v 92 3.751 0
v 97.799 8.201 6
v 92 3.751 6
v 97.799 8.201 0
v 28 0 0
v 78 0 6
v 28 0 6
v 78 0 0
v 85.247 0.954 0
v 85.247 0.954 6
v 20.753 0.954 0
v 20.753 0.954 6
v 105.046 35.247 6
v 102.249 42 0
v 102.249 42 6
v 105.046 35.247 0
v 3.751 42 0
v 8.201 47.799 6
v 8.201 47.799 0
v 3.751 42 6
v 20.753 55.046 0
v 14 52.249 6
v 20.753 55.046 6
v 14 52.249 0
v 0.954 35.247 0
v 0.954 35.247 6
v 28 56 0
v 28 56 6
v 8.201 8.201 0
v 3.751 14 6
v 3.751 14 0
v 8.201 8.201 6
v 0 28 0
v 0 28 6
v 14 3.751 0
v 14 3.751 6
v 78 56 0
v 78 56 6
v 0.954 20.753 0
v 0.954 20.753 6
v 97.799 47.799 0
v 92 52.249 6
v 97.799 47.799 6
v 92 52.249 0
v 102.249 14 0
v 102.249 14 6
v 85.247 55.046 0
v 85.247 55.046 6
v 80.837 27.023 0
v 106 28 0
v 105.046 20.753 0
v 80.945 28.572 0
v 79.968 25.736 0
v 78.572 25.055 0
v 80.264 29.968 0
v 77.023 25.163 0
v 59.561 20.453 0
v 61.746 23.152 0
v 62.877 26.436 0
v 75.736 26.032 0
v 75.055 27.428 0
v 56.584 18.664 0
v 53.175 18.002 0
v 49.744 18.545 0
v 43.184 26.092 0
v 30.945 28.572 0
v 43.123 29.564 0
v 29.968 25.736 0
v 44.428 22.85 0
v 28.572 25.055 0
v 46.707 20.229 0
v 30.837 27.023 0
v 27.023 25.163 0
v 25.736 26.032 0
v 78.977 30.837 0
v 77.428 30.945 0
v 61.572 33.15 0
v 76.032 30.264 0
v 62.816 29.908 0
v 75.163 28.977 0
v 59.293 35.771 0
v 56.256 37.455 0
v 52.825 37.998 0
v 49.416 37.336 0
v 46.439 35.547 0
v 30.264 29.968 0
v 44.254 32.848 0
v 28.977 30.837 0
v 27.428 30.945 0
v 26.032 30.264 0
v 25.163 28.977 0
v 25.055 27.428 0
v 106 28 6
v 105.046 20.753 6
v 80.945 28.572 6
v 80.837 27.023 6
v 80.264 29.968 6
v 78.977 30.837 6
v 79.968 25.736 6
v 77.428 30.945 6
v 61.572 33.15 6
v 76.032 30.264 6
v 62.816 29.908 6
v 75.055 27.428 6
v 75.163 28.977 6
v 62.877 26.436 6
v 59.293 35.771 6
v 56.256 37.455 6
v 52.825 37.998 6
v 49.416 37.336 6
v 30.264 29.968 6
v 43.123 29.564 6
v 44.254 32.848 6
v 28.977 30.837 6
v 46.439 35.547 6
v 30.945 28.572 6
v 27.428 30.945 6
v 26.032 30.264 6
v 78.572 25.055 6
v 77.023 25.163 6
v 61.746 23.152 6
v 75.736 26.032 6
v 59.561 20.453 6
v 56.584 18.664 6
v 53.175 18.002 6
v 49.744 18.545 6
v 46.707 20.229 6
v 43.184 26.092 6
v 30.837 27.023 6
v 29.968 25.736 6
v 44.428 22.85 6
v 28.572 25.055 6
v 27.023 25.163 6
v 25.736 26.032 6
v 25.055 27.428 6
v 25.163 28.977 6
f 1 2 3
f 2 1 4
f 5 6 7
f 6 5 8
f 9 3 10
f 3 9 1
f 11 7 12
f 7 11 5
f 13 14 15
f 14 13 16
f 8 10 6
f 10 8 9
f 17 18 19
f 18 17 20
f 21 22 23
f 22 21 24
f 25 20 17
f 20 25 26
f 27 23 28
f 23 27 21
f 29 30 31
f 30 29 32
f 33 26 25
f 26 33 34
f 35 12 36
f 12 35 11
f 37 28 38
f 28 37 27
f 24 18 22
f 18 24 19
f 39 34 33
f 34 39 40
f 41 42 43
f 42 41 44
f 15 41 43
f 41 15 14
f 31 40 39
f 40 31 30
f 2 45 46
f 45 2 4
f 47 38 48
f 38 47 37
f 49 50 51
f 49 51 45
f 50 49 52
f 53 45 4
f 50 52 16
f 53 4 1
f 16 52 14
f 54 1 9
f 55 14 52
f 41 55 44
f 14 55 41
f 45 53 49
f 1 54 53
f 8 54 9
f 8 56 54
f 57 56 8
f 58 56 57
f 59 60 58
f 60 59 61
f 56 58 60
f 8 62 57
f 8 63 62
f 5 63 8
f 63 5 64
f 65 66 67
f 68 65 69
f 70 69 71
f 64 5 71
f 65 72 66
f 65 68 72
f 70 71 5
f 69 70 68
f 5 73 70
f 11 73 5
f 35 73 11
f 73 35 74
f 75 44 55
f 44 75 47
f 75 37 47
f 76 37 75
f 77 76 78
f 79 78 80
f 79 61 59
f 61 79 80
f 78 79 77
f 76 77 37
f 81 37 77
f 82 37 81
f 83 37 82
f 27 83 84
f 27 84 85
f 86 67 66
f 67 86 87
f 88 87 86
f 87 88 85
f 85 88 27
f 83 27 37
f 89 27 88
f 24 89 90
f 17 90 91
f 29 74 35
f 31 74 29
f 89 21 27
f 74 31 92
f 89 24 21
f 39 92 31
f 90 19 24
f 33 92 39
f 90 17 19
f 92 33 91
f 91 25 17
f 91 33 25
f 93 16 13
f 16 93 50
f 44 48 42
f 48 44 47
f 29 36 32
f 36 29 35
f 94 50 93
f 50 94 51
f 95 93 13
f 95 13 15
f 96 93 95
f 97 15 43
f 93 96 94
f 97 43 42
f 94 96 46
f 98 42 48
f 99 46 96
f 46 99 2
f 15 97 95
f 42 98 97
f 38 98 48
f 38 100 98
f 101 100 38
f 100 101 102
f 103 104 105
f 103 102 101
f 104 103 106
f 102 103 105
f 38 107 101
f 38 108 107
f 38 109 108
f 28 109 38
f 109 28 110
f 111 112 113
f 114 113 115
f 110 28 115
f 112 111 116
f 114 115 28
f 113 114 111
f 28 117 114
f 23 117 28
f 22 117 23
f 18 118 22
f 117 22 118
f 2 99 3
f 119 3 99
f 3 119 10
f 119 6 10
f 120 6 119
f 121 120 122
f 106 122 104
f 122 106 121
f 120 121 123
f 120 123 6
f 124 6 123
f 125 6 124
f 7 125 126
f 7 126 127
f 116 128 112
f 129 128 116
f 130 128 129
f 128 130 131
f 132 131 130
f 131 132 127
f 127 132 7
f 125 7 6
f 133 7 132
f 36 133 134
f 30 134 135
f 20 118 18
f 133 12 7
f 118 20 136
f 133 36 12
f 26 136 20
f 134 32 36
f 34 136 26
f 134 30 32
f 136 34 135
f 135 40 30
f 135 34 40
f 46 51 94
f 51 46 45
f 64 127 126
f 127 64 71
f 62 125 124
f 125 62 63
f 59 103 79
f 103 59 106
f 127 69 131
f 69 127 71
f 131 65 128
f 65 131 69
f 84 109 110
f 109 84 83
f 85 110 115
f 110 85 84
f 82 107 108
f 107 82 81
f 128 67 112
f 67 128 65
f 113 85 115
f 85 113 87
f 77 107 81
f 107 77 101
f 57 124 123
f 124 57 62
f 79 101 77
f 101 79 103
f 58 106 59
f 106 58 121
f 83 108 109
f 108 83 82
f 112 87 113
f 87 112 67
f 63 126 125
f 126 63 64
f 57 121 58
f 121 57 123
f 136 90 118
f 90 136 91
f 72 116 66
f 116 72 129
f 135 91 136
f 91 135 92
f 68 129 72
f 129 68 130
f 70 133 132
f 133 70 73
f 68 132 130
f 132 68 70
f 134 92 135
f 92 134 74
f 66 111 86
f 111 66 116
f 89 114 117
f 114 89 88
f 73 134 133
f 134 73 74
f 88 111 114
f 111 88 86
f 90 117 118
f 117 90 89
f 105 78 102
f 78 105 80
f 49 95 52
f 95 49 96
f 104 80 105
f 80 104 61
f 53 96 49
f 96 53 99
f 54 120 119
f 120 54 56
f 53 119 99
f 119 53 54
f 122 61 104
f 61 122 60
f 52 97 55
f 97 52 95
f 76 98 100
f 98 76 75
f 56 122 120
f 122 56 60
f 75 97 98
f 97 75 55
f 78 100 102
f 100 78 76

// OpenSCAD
$fn = 32;

// ----------------------------------------------------------------------
// Spacer plate: obround span 50, caps R28
// ----------------------------------------------------------------------

// --- parameters (mm) ---
bore_r = 10;              // centre bore radius
bolt_r = 3;               // bolt hole radius
plate_t = 6;              // plate thickness, Z (extrusion height)
span = 50;                // obround span
cap_r = 28;               // cap radius

profile = [[28, 56], [20.753, 55.046], [14, 52.249], [8.201, 47.799], [3.751, 42], [0.954, 35.247], [0, 28], [0.954, 20.753], [3.751, 14], [8.201, 8.201], [14, 3.751], [20.753, 0.954], [28, 0], [78, 0], [85.247, 0.954], [92, 3.751], [97.799, 8.201], [102.249, 14], [105.046, 20.753], [106, 28], [105.046, 35.247], [102.249, 42], [97.799, 47.799], [92, 52.249], [85.247, 55.046], [78, 56]];  // primary outline, 26 points, counter clockwise
void_1 = [[62.816, 29.908], [61.572, 33.15], [59.293, 35.771], [56.256, 37.455], [52.825, 37.998], [49.416, 37.336], [46.439, 35.547], [44.254, 32.848], [43.123, 29.564], [43.184, 26.092], [44.428, 22.85], [46.707, 20.229], [49.744, 18.545], [53.175, 18.002], [56.584, 18.664], [59.561, 20.453], [61.746, 23.152], [62.877, 26.436]];  // centre bore, 18 points
void_2 = [[30.945, 28.572], [30.264, 29.968], [28.977, 30.837], [27.428, 30.945], [26.032, 30.264], [25.163, 28.977], [25.055, 27.428], [25.736, 26.032], [27.023, 25.163], [28.572, 25.055], [29.968, 25.736], [30.837, 27.023]];  // end hole, 12 points
void_3 = [[80.945, 28.572], [80.264, 29.968], [78.977, 30.837], [77.428, 30.945], [76.032, 30.264], [75.163, 28.977], [75.055, 27.428], [75.736, 26.032], [77.023, 25.163], [78.572, 25.055], [79.968, 25.736], [80.837, 27.023]];  // end hole, 12 points

// --- the one profile operation ---
difference() {
  linear_extrude(height = plate_t) polygon(points = profile);
  translate([0, 0, -1])
    linear_extrude(height = plate_t + 2) polygon(points = void_1);
  translate([0, 0, -1])
    linear_extrude(height = plate_t + 2) polygon(points = void_2);
  translate([0, 0, -1])
    linear_extrude(height = plate_t + 2) polygon(points = void_3);
}
